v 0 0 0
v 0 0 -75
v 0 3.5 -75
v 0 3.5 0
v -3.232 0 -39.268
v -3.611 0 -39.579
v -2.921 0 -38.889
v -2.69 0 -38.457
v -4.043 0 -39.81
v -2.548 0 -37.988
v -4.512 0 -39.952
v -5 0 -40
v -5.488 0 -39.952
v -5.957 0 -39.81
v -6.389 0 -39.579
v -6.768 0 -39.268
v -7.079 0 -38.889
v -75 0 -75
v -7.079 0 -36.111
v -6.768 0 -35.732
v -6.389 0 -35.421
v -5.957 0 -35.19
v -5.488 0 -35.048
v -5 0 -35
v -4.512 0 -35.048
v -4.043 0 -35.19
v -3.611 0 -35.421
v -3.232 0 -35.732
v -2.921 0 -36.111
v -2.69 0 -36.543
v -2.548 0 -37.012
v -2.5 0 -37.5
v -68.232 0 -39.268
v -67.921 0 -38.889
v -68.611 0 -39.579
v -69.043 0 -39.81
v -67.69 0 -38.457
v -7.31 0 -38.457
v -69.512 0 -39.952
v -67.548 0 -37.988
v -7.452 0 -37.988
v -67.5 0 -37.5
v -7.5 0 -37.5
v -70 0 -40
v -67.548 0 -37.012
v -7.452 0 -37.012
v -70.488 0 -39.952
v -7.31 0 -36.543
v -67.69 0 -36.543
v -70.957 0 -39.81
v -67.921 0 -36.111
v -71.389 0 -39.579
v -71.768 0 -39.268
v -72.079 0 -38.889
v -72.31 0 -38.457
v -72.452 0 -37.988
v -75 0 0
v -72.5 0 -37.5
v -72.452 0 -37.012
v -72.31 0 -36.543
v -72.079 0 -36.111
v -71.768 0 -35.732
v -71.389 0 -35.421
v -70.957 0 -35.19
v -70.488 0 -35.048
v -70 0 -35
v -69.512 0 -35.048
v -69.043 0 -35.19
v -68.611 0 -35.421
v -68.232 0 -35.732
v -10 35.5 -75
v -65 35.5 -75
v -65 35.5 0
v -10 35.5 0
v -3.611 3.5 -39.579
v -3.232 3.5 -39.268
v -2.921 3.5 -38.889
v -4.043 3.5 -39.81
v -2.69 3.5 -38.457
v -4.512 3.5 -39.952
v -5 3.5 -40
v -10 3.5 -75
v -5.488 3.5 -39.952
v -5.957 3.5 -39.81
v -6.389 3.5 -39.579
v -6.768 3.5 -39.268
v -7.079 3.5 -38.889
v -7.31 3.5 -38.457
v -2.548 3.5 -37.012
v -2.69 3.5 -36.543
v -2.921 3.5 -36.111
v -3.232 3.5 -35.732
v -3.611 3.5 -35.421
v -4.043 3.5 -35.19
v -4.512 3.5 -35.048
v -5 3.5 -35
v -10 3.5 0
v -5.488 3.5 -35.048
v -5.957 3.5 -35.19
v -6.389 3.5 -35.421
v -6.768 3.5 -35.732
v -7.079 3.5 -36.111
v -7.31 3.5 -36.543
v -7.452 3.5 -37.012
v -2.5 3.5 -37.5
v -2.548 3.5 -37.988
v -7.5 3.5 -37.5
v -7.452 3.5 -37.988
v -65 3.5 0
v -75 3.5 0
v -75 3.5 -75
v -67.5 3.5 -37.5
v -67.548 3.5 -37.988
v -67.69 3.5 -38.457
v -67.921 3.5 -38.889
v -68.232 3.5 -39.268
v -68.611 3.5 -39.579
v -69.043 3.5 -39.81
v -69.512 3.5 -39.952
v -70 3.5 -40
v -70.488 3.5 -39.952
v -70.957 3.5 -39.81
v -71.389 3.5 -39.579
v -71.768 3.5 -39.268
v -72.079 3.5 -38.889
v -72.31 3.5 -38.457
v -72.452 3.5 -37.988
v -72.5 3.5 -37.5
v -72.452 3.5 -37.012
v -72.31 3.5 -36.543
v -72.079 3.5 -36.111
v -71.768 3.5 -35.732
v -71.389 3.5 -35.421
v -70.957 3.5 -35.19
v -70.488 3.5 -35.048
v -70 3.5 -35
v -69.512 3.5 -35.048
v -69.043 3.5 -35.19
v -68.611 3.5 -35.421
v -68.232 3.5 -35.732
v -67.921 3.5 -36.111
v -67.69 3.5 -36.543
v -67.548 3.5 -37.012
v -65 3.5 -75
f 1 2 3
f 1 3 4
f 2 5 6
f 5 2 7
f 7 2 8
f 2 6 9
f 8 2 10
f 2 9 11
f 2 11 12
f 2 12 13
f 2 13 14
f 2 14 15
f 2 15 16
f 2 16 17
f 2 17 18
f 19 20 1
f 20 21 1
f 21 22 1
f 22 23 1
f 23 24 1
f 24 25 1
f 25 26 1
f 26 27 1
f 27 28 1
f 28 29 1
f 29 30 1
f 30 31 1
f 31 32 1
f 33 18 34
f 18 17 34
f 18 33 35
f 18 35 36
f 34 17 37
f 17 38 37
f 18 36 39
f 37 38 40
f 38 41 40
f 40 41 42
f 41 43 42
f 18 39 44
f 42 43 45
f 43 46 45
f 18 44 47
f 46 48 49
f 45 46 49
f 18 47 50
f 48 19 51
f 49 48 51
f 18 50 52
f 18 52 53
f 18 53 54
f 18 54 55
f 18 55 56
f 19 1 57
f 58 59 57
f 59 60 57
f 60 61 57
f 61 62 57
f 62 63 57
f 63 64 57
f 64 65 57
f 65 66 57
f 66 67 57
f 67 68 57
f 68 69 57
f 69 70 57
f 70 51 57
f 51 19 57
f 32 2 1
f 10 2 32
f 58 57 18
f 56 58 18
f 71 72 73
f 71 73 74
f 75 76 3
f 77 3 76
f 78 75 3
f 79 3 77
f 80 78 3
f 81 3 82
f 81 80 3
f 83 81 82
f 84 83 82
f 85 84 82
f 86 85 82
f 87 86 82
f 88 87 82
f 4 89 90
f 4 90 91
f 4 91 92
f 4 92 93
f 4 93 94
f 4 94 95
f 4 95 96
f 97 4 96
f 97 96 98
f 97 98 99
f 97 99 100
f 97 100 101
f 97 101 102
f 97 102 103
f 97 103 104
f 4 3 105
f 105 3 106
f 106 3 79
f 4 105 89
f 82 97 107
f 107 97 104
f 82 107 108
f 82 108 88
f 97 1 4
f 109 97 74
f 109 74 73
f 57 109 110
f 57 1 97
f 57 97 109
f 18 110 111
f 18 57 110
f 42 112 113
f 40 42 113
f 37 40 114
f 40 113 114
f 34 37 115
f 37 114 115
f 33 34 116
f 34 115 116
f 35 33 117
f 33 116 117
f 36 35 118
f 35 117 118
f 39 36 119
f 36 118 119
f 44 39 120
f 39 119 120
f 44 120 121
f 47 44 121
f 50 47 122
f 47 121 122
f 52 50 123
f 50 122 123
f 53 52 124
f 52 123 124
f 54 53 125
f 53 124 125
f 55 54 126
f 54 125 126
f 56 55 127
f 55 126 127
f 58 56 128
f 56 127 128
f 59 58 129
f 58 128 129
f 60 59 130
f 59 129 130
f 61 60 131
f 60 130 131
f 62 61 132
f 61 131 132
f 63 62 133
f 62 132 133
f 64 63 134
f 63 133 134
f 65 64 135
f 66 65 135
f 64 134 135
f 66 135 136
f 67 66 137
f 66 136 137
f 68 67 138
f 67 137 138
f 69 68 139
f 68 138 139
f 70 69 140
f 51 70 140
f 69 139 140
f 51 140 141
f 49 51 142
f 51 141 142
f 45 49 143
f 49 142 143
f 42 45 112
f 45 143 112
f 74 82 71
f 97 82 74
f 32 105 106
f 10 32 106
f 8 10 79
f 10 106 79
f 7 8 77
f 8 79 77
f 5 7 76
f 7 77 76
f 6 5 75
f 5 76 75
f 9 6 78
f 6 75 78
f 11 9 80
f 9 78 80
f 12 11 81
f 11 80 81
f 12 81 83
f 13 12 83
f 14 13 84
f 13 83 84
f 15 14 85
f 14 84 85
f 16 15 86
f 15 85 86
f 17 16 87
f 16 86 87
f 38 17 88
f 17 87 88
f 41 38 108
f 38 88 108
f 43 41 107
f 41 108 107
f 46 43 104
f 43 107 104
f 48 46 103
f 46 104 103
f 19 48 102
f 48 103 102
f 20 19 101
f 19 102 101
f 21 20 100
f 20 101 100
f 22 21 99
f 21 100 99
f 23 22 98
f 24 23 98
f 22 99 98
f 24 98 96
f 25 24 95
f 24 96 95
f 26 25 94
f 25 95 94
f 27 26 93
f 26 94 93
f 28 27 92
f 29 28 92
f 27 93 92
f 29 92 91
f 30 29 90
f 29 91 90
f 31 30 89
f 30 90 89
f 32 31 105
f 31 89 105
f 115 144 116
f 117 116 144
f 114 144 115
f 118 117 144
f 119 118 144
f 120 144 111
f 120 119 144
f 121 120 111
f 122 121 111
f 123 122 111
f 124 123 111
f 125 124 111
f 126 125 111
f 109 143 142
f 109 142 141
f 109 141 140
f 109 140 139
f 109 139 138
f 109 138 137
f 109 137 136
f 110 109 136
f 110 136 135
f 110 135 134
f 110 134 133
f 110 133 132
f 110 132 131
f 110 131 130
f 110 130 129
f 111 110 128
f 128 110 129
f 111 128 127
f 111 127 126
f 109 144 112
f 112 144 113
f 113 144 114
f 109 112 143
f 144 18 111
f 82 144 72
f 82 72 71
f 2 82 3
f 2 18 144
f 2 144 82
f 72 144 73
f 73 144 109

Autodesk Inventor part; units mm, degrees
ref_plane "YZ Plane" through (0, 0, 0) normal (1, 0, 0) x (0, 1, 0)
ref_plane "XZ Plane" through (0, 0, 0) normal (0, 1, 0) x (-1, 0, 0)
ref_plane "XY Plane" through (0, 0, 0) normal (0, 0, 1) x (1, 0, 0)
sketch "Sketch1" plane through (0, 0, 0) normal (0, 1, 0) x (-1, 0, 0)
  line L0 (0, 0) -> (75, 0)
  line L1 (75, 0) -> (75, -75)
  line L2 (75, -75) -> (0, -75)
  line L3 (0, -75) -> (0, 0)
  dimension "d0" = 75
  dimension "d1" = 75
extrude "Extrusion1" add sketch "Sketch1" along normal blind 3.5
sketch "Sketch2" plane through (0, 3.5, 0) normal (0, 1, 0) x (1, 0, 0)
  line L0 (-75, 0) -> (0, 0) projected
  line L1 (0, 0) -> (0, 75) projected
  line L2 (0, 75) -> (-75, 75) projected
  line L3 (-75, 75) -> (-75, 0) projected
  line L4 (-75, 75) -> (-75, 0) projected
  line L5 (0, 0) -> (0, 75) projected
  line L6 (-5, 5) -> (-75, 5)
  line L7 (-70, 75) -> (-70, 0)
  circle A0 centre (-70, 37.5) radius 2.5
  circle A1 centre (-5, 37.5) radius 2.5
  line L8 (-75, 37.5) -> (-7.5, 37.5)
  line L9 (-2.5, 37.5) -> (0, 37.5)
  line L10 (-5, 75) -> (-5, 40)
  line L11 (-5, 35) -> (-5, 5)
  dimension "d5" = 5
  dimension "d6" = 5
  dimension "d7" = 5
extrude "Extrusion2" cut sketch "Sketch2" against normal blind 3.5 contours A0 L8 L7 | L7 L8 A0 | A0 L7 L8 | A1 | L7 A0 L8
sketch "Sketch3" plane through (0, 3.5, 0) normal (0, 1, 0) x (1, 0, 0)
  circle A0 centre (-70, 37.5) radius 2.5 projected
  circle A1 centre (-5, 37.5) radius 2.5 projected
  line L0 (-75, 0) -> (0, 0) projected
  line L1 (0, 0) -> (0, 75) projected
  line L2 (0, 75) -> (-75, 75) projected
  line L3 (-75, 75) -> (-75, 0) projected
  line L4 (-10, 10) -> (-10, 65)
  line L5 (-65, 65) -> (-65, 10)
  line L6 (-65, 65) -> (-65, 75)
  line L7 (0, 75) -> (-75, 75) projected
  line L8 (-65, 10) -> (-65, 0)
  line L9 (-75, 0) -> (0, 0) projected
  line L10 (-10, 10) -> (-10, 0)
  line L11 (-10, 65) -> (-10, 75)
  dimension "d10" = 10
extrude "Extrusion3" add sketch "Sketch3" along normal blind 32 contours L8 L5 L6 L2 L11 L4 L10 L0
properties part number "power_suply"
